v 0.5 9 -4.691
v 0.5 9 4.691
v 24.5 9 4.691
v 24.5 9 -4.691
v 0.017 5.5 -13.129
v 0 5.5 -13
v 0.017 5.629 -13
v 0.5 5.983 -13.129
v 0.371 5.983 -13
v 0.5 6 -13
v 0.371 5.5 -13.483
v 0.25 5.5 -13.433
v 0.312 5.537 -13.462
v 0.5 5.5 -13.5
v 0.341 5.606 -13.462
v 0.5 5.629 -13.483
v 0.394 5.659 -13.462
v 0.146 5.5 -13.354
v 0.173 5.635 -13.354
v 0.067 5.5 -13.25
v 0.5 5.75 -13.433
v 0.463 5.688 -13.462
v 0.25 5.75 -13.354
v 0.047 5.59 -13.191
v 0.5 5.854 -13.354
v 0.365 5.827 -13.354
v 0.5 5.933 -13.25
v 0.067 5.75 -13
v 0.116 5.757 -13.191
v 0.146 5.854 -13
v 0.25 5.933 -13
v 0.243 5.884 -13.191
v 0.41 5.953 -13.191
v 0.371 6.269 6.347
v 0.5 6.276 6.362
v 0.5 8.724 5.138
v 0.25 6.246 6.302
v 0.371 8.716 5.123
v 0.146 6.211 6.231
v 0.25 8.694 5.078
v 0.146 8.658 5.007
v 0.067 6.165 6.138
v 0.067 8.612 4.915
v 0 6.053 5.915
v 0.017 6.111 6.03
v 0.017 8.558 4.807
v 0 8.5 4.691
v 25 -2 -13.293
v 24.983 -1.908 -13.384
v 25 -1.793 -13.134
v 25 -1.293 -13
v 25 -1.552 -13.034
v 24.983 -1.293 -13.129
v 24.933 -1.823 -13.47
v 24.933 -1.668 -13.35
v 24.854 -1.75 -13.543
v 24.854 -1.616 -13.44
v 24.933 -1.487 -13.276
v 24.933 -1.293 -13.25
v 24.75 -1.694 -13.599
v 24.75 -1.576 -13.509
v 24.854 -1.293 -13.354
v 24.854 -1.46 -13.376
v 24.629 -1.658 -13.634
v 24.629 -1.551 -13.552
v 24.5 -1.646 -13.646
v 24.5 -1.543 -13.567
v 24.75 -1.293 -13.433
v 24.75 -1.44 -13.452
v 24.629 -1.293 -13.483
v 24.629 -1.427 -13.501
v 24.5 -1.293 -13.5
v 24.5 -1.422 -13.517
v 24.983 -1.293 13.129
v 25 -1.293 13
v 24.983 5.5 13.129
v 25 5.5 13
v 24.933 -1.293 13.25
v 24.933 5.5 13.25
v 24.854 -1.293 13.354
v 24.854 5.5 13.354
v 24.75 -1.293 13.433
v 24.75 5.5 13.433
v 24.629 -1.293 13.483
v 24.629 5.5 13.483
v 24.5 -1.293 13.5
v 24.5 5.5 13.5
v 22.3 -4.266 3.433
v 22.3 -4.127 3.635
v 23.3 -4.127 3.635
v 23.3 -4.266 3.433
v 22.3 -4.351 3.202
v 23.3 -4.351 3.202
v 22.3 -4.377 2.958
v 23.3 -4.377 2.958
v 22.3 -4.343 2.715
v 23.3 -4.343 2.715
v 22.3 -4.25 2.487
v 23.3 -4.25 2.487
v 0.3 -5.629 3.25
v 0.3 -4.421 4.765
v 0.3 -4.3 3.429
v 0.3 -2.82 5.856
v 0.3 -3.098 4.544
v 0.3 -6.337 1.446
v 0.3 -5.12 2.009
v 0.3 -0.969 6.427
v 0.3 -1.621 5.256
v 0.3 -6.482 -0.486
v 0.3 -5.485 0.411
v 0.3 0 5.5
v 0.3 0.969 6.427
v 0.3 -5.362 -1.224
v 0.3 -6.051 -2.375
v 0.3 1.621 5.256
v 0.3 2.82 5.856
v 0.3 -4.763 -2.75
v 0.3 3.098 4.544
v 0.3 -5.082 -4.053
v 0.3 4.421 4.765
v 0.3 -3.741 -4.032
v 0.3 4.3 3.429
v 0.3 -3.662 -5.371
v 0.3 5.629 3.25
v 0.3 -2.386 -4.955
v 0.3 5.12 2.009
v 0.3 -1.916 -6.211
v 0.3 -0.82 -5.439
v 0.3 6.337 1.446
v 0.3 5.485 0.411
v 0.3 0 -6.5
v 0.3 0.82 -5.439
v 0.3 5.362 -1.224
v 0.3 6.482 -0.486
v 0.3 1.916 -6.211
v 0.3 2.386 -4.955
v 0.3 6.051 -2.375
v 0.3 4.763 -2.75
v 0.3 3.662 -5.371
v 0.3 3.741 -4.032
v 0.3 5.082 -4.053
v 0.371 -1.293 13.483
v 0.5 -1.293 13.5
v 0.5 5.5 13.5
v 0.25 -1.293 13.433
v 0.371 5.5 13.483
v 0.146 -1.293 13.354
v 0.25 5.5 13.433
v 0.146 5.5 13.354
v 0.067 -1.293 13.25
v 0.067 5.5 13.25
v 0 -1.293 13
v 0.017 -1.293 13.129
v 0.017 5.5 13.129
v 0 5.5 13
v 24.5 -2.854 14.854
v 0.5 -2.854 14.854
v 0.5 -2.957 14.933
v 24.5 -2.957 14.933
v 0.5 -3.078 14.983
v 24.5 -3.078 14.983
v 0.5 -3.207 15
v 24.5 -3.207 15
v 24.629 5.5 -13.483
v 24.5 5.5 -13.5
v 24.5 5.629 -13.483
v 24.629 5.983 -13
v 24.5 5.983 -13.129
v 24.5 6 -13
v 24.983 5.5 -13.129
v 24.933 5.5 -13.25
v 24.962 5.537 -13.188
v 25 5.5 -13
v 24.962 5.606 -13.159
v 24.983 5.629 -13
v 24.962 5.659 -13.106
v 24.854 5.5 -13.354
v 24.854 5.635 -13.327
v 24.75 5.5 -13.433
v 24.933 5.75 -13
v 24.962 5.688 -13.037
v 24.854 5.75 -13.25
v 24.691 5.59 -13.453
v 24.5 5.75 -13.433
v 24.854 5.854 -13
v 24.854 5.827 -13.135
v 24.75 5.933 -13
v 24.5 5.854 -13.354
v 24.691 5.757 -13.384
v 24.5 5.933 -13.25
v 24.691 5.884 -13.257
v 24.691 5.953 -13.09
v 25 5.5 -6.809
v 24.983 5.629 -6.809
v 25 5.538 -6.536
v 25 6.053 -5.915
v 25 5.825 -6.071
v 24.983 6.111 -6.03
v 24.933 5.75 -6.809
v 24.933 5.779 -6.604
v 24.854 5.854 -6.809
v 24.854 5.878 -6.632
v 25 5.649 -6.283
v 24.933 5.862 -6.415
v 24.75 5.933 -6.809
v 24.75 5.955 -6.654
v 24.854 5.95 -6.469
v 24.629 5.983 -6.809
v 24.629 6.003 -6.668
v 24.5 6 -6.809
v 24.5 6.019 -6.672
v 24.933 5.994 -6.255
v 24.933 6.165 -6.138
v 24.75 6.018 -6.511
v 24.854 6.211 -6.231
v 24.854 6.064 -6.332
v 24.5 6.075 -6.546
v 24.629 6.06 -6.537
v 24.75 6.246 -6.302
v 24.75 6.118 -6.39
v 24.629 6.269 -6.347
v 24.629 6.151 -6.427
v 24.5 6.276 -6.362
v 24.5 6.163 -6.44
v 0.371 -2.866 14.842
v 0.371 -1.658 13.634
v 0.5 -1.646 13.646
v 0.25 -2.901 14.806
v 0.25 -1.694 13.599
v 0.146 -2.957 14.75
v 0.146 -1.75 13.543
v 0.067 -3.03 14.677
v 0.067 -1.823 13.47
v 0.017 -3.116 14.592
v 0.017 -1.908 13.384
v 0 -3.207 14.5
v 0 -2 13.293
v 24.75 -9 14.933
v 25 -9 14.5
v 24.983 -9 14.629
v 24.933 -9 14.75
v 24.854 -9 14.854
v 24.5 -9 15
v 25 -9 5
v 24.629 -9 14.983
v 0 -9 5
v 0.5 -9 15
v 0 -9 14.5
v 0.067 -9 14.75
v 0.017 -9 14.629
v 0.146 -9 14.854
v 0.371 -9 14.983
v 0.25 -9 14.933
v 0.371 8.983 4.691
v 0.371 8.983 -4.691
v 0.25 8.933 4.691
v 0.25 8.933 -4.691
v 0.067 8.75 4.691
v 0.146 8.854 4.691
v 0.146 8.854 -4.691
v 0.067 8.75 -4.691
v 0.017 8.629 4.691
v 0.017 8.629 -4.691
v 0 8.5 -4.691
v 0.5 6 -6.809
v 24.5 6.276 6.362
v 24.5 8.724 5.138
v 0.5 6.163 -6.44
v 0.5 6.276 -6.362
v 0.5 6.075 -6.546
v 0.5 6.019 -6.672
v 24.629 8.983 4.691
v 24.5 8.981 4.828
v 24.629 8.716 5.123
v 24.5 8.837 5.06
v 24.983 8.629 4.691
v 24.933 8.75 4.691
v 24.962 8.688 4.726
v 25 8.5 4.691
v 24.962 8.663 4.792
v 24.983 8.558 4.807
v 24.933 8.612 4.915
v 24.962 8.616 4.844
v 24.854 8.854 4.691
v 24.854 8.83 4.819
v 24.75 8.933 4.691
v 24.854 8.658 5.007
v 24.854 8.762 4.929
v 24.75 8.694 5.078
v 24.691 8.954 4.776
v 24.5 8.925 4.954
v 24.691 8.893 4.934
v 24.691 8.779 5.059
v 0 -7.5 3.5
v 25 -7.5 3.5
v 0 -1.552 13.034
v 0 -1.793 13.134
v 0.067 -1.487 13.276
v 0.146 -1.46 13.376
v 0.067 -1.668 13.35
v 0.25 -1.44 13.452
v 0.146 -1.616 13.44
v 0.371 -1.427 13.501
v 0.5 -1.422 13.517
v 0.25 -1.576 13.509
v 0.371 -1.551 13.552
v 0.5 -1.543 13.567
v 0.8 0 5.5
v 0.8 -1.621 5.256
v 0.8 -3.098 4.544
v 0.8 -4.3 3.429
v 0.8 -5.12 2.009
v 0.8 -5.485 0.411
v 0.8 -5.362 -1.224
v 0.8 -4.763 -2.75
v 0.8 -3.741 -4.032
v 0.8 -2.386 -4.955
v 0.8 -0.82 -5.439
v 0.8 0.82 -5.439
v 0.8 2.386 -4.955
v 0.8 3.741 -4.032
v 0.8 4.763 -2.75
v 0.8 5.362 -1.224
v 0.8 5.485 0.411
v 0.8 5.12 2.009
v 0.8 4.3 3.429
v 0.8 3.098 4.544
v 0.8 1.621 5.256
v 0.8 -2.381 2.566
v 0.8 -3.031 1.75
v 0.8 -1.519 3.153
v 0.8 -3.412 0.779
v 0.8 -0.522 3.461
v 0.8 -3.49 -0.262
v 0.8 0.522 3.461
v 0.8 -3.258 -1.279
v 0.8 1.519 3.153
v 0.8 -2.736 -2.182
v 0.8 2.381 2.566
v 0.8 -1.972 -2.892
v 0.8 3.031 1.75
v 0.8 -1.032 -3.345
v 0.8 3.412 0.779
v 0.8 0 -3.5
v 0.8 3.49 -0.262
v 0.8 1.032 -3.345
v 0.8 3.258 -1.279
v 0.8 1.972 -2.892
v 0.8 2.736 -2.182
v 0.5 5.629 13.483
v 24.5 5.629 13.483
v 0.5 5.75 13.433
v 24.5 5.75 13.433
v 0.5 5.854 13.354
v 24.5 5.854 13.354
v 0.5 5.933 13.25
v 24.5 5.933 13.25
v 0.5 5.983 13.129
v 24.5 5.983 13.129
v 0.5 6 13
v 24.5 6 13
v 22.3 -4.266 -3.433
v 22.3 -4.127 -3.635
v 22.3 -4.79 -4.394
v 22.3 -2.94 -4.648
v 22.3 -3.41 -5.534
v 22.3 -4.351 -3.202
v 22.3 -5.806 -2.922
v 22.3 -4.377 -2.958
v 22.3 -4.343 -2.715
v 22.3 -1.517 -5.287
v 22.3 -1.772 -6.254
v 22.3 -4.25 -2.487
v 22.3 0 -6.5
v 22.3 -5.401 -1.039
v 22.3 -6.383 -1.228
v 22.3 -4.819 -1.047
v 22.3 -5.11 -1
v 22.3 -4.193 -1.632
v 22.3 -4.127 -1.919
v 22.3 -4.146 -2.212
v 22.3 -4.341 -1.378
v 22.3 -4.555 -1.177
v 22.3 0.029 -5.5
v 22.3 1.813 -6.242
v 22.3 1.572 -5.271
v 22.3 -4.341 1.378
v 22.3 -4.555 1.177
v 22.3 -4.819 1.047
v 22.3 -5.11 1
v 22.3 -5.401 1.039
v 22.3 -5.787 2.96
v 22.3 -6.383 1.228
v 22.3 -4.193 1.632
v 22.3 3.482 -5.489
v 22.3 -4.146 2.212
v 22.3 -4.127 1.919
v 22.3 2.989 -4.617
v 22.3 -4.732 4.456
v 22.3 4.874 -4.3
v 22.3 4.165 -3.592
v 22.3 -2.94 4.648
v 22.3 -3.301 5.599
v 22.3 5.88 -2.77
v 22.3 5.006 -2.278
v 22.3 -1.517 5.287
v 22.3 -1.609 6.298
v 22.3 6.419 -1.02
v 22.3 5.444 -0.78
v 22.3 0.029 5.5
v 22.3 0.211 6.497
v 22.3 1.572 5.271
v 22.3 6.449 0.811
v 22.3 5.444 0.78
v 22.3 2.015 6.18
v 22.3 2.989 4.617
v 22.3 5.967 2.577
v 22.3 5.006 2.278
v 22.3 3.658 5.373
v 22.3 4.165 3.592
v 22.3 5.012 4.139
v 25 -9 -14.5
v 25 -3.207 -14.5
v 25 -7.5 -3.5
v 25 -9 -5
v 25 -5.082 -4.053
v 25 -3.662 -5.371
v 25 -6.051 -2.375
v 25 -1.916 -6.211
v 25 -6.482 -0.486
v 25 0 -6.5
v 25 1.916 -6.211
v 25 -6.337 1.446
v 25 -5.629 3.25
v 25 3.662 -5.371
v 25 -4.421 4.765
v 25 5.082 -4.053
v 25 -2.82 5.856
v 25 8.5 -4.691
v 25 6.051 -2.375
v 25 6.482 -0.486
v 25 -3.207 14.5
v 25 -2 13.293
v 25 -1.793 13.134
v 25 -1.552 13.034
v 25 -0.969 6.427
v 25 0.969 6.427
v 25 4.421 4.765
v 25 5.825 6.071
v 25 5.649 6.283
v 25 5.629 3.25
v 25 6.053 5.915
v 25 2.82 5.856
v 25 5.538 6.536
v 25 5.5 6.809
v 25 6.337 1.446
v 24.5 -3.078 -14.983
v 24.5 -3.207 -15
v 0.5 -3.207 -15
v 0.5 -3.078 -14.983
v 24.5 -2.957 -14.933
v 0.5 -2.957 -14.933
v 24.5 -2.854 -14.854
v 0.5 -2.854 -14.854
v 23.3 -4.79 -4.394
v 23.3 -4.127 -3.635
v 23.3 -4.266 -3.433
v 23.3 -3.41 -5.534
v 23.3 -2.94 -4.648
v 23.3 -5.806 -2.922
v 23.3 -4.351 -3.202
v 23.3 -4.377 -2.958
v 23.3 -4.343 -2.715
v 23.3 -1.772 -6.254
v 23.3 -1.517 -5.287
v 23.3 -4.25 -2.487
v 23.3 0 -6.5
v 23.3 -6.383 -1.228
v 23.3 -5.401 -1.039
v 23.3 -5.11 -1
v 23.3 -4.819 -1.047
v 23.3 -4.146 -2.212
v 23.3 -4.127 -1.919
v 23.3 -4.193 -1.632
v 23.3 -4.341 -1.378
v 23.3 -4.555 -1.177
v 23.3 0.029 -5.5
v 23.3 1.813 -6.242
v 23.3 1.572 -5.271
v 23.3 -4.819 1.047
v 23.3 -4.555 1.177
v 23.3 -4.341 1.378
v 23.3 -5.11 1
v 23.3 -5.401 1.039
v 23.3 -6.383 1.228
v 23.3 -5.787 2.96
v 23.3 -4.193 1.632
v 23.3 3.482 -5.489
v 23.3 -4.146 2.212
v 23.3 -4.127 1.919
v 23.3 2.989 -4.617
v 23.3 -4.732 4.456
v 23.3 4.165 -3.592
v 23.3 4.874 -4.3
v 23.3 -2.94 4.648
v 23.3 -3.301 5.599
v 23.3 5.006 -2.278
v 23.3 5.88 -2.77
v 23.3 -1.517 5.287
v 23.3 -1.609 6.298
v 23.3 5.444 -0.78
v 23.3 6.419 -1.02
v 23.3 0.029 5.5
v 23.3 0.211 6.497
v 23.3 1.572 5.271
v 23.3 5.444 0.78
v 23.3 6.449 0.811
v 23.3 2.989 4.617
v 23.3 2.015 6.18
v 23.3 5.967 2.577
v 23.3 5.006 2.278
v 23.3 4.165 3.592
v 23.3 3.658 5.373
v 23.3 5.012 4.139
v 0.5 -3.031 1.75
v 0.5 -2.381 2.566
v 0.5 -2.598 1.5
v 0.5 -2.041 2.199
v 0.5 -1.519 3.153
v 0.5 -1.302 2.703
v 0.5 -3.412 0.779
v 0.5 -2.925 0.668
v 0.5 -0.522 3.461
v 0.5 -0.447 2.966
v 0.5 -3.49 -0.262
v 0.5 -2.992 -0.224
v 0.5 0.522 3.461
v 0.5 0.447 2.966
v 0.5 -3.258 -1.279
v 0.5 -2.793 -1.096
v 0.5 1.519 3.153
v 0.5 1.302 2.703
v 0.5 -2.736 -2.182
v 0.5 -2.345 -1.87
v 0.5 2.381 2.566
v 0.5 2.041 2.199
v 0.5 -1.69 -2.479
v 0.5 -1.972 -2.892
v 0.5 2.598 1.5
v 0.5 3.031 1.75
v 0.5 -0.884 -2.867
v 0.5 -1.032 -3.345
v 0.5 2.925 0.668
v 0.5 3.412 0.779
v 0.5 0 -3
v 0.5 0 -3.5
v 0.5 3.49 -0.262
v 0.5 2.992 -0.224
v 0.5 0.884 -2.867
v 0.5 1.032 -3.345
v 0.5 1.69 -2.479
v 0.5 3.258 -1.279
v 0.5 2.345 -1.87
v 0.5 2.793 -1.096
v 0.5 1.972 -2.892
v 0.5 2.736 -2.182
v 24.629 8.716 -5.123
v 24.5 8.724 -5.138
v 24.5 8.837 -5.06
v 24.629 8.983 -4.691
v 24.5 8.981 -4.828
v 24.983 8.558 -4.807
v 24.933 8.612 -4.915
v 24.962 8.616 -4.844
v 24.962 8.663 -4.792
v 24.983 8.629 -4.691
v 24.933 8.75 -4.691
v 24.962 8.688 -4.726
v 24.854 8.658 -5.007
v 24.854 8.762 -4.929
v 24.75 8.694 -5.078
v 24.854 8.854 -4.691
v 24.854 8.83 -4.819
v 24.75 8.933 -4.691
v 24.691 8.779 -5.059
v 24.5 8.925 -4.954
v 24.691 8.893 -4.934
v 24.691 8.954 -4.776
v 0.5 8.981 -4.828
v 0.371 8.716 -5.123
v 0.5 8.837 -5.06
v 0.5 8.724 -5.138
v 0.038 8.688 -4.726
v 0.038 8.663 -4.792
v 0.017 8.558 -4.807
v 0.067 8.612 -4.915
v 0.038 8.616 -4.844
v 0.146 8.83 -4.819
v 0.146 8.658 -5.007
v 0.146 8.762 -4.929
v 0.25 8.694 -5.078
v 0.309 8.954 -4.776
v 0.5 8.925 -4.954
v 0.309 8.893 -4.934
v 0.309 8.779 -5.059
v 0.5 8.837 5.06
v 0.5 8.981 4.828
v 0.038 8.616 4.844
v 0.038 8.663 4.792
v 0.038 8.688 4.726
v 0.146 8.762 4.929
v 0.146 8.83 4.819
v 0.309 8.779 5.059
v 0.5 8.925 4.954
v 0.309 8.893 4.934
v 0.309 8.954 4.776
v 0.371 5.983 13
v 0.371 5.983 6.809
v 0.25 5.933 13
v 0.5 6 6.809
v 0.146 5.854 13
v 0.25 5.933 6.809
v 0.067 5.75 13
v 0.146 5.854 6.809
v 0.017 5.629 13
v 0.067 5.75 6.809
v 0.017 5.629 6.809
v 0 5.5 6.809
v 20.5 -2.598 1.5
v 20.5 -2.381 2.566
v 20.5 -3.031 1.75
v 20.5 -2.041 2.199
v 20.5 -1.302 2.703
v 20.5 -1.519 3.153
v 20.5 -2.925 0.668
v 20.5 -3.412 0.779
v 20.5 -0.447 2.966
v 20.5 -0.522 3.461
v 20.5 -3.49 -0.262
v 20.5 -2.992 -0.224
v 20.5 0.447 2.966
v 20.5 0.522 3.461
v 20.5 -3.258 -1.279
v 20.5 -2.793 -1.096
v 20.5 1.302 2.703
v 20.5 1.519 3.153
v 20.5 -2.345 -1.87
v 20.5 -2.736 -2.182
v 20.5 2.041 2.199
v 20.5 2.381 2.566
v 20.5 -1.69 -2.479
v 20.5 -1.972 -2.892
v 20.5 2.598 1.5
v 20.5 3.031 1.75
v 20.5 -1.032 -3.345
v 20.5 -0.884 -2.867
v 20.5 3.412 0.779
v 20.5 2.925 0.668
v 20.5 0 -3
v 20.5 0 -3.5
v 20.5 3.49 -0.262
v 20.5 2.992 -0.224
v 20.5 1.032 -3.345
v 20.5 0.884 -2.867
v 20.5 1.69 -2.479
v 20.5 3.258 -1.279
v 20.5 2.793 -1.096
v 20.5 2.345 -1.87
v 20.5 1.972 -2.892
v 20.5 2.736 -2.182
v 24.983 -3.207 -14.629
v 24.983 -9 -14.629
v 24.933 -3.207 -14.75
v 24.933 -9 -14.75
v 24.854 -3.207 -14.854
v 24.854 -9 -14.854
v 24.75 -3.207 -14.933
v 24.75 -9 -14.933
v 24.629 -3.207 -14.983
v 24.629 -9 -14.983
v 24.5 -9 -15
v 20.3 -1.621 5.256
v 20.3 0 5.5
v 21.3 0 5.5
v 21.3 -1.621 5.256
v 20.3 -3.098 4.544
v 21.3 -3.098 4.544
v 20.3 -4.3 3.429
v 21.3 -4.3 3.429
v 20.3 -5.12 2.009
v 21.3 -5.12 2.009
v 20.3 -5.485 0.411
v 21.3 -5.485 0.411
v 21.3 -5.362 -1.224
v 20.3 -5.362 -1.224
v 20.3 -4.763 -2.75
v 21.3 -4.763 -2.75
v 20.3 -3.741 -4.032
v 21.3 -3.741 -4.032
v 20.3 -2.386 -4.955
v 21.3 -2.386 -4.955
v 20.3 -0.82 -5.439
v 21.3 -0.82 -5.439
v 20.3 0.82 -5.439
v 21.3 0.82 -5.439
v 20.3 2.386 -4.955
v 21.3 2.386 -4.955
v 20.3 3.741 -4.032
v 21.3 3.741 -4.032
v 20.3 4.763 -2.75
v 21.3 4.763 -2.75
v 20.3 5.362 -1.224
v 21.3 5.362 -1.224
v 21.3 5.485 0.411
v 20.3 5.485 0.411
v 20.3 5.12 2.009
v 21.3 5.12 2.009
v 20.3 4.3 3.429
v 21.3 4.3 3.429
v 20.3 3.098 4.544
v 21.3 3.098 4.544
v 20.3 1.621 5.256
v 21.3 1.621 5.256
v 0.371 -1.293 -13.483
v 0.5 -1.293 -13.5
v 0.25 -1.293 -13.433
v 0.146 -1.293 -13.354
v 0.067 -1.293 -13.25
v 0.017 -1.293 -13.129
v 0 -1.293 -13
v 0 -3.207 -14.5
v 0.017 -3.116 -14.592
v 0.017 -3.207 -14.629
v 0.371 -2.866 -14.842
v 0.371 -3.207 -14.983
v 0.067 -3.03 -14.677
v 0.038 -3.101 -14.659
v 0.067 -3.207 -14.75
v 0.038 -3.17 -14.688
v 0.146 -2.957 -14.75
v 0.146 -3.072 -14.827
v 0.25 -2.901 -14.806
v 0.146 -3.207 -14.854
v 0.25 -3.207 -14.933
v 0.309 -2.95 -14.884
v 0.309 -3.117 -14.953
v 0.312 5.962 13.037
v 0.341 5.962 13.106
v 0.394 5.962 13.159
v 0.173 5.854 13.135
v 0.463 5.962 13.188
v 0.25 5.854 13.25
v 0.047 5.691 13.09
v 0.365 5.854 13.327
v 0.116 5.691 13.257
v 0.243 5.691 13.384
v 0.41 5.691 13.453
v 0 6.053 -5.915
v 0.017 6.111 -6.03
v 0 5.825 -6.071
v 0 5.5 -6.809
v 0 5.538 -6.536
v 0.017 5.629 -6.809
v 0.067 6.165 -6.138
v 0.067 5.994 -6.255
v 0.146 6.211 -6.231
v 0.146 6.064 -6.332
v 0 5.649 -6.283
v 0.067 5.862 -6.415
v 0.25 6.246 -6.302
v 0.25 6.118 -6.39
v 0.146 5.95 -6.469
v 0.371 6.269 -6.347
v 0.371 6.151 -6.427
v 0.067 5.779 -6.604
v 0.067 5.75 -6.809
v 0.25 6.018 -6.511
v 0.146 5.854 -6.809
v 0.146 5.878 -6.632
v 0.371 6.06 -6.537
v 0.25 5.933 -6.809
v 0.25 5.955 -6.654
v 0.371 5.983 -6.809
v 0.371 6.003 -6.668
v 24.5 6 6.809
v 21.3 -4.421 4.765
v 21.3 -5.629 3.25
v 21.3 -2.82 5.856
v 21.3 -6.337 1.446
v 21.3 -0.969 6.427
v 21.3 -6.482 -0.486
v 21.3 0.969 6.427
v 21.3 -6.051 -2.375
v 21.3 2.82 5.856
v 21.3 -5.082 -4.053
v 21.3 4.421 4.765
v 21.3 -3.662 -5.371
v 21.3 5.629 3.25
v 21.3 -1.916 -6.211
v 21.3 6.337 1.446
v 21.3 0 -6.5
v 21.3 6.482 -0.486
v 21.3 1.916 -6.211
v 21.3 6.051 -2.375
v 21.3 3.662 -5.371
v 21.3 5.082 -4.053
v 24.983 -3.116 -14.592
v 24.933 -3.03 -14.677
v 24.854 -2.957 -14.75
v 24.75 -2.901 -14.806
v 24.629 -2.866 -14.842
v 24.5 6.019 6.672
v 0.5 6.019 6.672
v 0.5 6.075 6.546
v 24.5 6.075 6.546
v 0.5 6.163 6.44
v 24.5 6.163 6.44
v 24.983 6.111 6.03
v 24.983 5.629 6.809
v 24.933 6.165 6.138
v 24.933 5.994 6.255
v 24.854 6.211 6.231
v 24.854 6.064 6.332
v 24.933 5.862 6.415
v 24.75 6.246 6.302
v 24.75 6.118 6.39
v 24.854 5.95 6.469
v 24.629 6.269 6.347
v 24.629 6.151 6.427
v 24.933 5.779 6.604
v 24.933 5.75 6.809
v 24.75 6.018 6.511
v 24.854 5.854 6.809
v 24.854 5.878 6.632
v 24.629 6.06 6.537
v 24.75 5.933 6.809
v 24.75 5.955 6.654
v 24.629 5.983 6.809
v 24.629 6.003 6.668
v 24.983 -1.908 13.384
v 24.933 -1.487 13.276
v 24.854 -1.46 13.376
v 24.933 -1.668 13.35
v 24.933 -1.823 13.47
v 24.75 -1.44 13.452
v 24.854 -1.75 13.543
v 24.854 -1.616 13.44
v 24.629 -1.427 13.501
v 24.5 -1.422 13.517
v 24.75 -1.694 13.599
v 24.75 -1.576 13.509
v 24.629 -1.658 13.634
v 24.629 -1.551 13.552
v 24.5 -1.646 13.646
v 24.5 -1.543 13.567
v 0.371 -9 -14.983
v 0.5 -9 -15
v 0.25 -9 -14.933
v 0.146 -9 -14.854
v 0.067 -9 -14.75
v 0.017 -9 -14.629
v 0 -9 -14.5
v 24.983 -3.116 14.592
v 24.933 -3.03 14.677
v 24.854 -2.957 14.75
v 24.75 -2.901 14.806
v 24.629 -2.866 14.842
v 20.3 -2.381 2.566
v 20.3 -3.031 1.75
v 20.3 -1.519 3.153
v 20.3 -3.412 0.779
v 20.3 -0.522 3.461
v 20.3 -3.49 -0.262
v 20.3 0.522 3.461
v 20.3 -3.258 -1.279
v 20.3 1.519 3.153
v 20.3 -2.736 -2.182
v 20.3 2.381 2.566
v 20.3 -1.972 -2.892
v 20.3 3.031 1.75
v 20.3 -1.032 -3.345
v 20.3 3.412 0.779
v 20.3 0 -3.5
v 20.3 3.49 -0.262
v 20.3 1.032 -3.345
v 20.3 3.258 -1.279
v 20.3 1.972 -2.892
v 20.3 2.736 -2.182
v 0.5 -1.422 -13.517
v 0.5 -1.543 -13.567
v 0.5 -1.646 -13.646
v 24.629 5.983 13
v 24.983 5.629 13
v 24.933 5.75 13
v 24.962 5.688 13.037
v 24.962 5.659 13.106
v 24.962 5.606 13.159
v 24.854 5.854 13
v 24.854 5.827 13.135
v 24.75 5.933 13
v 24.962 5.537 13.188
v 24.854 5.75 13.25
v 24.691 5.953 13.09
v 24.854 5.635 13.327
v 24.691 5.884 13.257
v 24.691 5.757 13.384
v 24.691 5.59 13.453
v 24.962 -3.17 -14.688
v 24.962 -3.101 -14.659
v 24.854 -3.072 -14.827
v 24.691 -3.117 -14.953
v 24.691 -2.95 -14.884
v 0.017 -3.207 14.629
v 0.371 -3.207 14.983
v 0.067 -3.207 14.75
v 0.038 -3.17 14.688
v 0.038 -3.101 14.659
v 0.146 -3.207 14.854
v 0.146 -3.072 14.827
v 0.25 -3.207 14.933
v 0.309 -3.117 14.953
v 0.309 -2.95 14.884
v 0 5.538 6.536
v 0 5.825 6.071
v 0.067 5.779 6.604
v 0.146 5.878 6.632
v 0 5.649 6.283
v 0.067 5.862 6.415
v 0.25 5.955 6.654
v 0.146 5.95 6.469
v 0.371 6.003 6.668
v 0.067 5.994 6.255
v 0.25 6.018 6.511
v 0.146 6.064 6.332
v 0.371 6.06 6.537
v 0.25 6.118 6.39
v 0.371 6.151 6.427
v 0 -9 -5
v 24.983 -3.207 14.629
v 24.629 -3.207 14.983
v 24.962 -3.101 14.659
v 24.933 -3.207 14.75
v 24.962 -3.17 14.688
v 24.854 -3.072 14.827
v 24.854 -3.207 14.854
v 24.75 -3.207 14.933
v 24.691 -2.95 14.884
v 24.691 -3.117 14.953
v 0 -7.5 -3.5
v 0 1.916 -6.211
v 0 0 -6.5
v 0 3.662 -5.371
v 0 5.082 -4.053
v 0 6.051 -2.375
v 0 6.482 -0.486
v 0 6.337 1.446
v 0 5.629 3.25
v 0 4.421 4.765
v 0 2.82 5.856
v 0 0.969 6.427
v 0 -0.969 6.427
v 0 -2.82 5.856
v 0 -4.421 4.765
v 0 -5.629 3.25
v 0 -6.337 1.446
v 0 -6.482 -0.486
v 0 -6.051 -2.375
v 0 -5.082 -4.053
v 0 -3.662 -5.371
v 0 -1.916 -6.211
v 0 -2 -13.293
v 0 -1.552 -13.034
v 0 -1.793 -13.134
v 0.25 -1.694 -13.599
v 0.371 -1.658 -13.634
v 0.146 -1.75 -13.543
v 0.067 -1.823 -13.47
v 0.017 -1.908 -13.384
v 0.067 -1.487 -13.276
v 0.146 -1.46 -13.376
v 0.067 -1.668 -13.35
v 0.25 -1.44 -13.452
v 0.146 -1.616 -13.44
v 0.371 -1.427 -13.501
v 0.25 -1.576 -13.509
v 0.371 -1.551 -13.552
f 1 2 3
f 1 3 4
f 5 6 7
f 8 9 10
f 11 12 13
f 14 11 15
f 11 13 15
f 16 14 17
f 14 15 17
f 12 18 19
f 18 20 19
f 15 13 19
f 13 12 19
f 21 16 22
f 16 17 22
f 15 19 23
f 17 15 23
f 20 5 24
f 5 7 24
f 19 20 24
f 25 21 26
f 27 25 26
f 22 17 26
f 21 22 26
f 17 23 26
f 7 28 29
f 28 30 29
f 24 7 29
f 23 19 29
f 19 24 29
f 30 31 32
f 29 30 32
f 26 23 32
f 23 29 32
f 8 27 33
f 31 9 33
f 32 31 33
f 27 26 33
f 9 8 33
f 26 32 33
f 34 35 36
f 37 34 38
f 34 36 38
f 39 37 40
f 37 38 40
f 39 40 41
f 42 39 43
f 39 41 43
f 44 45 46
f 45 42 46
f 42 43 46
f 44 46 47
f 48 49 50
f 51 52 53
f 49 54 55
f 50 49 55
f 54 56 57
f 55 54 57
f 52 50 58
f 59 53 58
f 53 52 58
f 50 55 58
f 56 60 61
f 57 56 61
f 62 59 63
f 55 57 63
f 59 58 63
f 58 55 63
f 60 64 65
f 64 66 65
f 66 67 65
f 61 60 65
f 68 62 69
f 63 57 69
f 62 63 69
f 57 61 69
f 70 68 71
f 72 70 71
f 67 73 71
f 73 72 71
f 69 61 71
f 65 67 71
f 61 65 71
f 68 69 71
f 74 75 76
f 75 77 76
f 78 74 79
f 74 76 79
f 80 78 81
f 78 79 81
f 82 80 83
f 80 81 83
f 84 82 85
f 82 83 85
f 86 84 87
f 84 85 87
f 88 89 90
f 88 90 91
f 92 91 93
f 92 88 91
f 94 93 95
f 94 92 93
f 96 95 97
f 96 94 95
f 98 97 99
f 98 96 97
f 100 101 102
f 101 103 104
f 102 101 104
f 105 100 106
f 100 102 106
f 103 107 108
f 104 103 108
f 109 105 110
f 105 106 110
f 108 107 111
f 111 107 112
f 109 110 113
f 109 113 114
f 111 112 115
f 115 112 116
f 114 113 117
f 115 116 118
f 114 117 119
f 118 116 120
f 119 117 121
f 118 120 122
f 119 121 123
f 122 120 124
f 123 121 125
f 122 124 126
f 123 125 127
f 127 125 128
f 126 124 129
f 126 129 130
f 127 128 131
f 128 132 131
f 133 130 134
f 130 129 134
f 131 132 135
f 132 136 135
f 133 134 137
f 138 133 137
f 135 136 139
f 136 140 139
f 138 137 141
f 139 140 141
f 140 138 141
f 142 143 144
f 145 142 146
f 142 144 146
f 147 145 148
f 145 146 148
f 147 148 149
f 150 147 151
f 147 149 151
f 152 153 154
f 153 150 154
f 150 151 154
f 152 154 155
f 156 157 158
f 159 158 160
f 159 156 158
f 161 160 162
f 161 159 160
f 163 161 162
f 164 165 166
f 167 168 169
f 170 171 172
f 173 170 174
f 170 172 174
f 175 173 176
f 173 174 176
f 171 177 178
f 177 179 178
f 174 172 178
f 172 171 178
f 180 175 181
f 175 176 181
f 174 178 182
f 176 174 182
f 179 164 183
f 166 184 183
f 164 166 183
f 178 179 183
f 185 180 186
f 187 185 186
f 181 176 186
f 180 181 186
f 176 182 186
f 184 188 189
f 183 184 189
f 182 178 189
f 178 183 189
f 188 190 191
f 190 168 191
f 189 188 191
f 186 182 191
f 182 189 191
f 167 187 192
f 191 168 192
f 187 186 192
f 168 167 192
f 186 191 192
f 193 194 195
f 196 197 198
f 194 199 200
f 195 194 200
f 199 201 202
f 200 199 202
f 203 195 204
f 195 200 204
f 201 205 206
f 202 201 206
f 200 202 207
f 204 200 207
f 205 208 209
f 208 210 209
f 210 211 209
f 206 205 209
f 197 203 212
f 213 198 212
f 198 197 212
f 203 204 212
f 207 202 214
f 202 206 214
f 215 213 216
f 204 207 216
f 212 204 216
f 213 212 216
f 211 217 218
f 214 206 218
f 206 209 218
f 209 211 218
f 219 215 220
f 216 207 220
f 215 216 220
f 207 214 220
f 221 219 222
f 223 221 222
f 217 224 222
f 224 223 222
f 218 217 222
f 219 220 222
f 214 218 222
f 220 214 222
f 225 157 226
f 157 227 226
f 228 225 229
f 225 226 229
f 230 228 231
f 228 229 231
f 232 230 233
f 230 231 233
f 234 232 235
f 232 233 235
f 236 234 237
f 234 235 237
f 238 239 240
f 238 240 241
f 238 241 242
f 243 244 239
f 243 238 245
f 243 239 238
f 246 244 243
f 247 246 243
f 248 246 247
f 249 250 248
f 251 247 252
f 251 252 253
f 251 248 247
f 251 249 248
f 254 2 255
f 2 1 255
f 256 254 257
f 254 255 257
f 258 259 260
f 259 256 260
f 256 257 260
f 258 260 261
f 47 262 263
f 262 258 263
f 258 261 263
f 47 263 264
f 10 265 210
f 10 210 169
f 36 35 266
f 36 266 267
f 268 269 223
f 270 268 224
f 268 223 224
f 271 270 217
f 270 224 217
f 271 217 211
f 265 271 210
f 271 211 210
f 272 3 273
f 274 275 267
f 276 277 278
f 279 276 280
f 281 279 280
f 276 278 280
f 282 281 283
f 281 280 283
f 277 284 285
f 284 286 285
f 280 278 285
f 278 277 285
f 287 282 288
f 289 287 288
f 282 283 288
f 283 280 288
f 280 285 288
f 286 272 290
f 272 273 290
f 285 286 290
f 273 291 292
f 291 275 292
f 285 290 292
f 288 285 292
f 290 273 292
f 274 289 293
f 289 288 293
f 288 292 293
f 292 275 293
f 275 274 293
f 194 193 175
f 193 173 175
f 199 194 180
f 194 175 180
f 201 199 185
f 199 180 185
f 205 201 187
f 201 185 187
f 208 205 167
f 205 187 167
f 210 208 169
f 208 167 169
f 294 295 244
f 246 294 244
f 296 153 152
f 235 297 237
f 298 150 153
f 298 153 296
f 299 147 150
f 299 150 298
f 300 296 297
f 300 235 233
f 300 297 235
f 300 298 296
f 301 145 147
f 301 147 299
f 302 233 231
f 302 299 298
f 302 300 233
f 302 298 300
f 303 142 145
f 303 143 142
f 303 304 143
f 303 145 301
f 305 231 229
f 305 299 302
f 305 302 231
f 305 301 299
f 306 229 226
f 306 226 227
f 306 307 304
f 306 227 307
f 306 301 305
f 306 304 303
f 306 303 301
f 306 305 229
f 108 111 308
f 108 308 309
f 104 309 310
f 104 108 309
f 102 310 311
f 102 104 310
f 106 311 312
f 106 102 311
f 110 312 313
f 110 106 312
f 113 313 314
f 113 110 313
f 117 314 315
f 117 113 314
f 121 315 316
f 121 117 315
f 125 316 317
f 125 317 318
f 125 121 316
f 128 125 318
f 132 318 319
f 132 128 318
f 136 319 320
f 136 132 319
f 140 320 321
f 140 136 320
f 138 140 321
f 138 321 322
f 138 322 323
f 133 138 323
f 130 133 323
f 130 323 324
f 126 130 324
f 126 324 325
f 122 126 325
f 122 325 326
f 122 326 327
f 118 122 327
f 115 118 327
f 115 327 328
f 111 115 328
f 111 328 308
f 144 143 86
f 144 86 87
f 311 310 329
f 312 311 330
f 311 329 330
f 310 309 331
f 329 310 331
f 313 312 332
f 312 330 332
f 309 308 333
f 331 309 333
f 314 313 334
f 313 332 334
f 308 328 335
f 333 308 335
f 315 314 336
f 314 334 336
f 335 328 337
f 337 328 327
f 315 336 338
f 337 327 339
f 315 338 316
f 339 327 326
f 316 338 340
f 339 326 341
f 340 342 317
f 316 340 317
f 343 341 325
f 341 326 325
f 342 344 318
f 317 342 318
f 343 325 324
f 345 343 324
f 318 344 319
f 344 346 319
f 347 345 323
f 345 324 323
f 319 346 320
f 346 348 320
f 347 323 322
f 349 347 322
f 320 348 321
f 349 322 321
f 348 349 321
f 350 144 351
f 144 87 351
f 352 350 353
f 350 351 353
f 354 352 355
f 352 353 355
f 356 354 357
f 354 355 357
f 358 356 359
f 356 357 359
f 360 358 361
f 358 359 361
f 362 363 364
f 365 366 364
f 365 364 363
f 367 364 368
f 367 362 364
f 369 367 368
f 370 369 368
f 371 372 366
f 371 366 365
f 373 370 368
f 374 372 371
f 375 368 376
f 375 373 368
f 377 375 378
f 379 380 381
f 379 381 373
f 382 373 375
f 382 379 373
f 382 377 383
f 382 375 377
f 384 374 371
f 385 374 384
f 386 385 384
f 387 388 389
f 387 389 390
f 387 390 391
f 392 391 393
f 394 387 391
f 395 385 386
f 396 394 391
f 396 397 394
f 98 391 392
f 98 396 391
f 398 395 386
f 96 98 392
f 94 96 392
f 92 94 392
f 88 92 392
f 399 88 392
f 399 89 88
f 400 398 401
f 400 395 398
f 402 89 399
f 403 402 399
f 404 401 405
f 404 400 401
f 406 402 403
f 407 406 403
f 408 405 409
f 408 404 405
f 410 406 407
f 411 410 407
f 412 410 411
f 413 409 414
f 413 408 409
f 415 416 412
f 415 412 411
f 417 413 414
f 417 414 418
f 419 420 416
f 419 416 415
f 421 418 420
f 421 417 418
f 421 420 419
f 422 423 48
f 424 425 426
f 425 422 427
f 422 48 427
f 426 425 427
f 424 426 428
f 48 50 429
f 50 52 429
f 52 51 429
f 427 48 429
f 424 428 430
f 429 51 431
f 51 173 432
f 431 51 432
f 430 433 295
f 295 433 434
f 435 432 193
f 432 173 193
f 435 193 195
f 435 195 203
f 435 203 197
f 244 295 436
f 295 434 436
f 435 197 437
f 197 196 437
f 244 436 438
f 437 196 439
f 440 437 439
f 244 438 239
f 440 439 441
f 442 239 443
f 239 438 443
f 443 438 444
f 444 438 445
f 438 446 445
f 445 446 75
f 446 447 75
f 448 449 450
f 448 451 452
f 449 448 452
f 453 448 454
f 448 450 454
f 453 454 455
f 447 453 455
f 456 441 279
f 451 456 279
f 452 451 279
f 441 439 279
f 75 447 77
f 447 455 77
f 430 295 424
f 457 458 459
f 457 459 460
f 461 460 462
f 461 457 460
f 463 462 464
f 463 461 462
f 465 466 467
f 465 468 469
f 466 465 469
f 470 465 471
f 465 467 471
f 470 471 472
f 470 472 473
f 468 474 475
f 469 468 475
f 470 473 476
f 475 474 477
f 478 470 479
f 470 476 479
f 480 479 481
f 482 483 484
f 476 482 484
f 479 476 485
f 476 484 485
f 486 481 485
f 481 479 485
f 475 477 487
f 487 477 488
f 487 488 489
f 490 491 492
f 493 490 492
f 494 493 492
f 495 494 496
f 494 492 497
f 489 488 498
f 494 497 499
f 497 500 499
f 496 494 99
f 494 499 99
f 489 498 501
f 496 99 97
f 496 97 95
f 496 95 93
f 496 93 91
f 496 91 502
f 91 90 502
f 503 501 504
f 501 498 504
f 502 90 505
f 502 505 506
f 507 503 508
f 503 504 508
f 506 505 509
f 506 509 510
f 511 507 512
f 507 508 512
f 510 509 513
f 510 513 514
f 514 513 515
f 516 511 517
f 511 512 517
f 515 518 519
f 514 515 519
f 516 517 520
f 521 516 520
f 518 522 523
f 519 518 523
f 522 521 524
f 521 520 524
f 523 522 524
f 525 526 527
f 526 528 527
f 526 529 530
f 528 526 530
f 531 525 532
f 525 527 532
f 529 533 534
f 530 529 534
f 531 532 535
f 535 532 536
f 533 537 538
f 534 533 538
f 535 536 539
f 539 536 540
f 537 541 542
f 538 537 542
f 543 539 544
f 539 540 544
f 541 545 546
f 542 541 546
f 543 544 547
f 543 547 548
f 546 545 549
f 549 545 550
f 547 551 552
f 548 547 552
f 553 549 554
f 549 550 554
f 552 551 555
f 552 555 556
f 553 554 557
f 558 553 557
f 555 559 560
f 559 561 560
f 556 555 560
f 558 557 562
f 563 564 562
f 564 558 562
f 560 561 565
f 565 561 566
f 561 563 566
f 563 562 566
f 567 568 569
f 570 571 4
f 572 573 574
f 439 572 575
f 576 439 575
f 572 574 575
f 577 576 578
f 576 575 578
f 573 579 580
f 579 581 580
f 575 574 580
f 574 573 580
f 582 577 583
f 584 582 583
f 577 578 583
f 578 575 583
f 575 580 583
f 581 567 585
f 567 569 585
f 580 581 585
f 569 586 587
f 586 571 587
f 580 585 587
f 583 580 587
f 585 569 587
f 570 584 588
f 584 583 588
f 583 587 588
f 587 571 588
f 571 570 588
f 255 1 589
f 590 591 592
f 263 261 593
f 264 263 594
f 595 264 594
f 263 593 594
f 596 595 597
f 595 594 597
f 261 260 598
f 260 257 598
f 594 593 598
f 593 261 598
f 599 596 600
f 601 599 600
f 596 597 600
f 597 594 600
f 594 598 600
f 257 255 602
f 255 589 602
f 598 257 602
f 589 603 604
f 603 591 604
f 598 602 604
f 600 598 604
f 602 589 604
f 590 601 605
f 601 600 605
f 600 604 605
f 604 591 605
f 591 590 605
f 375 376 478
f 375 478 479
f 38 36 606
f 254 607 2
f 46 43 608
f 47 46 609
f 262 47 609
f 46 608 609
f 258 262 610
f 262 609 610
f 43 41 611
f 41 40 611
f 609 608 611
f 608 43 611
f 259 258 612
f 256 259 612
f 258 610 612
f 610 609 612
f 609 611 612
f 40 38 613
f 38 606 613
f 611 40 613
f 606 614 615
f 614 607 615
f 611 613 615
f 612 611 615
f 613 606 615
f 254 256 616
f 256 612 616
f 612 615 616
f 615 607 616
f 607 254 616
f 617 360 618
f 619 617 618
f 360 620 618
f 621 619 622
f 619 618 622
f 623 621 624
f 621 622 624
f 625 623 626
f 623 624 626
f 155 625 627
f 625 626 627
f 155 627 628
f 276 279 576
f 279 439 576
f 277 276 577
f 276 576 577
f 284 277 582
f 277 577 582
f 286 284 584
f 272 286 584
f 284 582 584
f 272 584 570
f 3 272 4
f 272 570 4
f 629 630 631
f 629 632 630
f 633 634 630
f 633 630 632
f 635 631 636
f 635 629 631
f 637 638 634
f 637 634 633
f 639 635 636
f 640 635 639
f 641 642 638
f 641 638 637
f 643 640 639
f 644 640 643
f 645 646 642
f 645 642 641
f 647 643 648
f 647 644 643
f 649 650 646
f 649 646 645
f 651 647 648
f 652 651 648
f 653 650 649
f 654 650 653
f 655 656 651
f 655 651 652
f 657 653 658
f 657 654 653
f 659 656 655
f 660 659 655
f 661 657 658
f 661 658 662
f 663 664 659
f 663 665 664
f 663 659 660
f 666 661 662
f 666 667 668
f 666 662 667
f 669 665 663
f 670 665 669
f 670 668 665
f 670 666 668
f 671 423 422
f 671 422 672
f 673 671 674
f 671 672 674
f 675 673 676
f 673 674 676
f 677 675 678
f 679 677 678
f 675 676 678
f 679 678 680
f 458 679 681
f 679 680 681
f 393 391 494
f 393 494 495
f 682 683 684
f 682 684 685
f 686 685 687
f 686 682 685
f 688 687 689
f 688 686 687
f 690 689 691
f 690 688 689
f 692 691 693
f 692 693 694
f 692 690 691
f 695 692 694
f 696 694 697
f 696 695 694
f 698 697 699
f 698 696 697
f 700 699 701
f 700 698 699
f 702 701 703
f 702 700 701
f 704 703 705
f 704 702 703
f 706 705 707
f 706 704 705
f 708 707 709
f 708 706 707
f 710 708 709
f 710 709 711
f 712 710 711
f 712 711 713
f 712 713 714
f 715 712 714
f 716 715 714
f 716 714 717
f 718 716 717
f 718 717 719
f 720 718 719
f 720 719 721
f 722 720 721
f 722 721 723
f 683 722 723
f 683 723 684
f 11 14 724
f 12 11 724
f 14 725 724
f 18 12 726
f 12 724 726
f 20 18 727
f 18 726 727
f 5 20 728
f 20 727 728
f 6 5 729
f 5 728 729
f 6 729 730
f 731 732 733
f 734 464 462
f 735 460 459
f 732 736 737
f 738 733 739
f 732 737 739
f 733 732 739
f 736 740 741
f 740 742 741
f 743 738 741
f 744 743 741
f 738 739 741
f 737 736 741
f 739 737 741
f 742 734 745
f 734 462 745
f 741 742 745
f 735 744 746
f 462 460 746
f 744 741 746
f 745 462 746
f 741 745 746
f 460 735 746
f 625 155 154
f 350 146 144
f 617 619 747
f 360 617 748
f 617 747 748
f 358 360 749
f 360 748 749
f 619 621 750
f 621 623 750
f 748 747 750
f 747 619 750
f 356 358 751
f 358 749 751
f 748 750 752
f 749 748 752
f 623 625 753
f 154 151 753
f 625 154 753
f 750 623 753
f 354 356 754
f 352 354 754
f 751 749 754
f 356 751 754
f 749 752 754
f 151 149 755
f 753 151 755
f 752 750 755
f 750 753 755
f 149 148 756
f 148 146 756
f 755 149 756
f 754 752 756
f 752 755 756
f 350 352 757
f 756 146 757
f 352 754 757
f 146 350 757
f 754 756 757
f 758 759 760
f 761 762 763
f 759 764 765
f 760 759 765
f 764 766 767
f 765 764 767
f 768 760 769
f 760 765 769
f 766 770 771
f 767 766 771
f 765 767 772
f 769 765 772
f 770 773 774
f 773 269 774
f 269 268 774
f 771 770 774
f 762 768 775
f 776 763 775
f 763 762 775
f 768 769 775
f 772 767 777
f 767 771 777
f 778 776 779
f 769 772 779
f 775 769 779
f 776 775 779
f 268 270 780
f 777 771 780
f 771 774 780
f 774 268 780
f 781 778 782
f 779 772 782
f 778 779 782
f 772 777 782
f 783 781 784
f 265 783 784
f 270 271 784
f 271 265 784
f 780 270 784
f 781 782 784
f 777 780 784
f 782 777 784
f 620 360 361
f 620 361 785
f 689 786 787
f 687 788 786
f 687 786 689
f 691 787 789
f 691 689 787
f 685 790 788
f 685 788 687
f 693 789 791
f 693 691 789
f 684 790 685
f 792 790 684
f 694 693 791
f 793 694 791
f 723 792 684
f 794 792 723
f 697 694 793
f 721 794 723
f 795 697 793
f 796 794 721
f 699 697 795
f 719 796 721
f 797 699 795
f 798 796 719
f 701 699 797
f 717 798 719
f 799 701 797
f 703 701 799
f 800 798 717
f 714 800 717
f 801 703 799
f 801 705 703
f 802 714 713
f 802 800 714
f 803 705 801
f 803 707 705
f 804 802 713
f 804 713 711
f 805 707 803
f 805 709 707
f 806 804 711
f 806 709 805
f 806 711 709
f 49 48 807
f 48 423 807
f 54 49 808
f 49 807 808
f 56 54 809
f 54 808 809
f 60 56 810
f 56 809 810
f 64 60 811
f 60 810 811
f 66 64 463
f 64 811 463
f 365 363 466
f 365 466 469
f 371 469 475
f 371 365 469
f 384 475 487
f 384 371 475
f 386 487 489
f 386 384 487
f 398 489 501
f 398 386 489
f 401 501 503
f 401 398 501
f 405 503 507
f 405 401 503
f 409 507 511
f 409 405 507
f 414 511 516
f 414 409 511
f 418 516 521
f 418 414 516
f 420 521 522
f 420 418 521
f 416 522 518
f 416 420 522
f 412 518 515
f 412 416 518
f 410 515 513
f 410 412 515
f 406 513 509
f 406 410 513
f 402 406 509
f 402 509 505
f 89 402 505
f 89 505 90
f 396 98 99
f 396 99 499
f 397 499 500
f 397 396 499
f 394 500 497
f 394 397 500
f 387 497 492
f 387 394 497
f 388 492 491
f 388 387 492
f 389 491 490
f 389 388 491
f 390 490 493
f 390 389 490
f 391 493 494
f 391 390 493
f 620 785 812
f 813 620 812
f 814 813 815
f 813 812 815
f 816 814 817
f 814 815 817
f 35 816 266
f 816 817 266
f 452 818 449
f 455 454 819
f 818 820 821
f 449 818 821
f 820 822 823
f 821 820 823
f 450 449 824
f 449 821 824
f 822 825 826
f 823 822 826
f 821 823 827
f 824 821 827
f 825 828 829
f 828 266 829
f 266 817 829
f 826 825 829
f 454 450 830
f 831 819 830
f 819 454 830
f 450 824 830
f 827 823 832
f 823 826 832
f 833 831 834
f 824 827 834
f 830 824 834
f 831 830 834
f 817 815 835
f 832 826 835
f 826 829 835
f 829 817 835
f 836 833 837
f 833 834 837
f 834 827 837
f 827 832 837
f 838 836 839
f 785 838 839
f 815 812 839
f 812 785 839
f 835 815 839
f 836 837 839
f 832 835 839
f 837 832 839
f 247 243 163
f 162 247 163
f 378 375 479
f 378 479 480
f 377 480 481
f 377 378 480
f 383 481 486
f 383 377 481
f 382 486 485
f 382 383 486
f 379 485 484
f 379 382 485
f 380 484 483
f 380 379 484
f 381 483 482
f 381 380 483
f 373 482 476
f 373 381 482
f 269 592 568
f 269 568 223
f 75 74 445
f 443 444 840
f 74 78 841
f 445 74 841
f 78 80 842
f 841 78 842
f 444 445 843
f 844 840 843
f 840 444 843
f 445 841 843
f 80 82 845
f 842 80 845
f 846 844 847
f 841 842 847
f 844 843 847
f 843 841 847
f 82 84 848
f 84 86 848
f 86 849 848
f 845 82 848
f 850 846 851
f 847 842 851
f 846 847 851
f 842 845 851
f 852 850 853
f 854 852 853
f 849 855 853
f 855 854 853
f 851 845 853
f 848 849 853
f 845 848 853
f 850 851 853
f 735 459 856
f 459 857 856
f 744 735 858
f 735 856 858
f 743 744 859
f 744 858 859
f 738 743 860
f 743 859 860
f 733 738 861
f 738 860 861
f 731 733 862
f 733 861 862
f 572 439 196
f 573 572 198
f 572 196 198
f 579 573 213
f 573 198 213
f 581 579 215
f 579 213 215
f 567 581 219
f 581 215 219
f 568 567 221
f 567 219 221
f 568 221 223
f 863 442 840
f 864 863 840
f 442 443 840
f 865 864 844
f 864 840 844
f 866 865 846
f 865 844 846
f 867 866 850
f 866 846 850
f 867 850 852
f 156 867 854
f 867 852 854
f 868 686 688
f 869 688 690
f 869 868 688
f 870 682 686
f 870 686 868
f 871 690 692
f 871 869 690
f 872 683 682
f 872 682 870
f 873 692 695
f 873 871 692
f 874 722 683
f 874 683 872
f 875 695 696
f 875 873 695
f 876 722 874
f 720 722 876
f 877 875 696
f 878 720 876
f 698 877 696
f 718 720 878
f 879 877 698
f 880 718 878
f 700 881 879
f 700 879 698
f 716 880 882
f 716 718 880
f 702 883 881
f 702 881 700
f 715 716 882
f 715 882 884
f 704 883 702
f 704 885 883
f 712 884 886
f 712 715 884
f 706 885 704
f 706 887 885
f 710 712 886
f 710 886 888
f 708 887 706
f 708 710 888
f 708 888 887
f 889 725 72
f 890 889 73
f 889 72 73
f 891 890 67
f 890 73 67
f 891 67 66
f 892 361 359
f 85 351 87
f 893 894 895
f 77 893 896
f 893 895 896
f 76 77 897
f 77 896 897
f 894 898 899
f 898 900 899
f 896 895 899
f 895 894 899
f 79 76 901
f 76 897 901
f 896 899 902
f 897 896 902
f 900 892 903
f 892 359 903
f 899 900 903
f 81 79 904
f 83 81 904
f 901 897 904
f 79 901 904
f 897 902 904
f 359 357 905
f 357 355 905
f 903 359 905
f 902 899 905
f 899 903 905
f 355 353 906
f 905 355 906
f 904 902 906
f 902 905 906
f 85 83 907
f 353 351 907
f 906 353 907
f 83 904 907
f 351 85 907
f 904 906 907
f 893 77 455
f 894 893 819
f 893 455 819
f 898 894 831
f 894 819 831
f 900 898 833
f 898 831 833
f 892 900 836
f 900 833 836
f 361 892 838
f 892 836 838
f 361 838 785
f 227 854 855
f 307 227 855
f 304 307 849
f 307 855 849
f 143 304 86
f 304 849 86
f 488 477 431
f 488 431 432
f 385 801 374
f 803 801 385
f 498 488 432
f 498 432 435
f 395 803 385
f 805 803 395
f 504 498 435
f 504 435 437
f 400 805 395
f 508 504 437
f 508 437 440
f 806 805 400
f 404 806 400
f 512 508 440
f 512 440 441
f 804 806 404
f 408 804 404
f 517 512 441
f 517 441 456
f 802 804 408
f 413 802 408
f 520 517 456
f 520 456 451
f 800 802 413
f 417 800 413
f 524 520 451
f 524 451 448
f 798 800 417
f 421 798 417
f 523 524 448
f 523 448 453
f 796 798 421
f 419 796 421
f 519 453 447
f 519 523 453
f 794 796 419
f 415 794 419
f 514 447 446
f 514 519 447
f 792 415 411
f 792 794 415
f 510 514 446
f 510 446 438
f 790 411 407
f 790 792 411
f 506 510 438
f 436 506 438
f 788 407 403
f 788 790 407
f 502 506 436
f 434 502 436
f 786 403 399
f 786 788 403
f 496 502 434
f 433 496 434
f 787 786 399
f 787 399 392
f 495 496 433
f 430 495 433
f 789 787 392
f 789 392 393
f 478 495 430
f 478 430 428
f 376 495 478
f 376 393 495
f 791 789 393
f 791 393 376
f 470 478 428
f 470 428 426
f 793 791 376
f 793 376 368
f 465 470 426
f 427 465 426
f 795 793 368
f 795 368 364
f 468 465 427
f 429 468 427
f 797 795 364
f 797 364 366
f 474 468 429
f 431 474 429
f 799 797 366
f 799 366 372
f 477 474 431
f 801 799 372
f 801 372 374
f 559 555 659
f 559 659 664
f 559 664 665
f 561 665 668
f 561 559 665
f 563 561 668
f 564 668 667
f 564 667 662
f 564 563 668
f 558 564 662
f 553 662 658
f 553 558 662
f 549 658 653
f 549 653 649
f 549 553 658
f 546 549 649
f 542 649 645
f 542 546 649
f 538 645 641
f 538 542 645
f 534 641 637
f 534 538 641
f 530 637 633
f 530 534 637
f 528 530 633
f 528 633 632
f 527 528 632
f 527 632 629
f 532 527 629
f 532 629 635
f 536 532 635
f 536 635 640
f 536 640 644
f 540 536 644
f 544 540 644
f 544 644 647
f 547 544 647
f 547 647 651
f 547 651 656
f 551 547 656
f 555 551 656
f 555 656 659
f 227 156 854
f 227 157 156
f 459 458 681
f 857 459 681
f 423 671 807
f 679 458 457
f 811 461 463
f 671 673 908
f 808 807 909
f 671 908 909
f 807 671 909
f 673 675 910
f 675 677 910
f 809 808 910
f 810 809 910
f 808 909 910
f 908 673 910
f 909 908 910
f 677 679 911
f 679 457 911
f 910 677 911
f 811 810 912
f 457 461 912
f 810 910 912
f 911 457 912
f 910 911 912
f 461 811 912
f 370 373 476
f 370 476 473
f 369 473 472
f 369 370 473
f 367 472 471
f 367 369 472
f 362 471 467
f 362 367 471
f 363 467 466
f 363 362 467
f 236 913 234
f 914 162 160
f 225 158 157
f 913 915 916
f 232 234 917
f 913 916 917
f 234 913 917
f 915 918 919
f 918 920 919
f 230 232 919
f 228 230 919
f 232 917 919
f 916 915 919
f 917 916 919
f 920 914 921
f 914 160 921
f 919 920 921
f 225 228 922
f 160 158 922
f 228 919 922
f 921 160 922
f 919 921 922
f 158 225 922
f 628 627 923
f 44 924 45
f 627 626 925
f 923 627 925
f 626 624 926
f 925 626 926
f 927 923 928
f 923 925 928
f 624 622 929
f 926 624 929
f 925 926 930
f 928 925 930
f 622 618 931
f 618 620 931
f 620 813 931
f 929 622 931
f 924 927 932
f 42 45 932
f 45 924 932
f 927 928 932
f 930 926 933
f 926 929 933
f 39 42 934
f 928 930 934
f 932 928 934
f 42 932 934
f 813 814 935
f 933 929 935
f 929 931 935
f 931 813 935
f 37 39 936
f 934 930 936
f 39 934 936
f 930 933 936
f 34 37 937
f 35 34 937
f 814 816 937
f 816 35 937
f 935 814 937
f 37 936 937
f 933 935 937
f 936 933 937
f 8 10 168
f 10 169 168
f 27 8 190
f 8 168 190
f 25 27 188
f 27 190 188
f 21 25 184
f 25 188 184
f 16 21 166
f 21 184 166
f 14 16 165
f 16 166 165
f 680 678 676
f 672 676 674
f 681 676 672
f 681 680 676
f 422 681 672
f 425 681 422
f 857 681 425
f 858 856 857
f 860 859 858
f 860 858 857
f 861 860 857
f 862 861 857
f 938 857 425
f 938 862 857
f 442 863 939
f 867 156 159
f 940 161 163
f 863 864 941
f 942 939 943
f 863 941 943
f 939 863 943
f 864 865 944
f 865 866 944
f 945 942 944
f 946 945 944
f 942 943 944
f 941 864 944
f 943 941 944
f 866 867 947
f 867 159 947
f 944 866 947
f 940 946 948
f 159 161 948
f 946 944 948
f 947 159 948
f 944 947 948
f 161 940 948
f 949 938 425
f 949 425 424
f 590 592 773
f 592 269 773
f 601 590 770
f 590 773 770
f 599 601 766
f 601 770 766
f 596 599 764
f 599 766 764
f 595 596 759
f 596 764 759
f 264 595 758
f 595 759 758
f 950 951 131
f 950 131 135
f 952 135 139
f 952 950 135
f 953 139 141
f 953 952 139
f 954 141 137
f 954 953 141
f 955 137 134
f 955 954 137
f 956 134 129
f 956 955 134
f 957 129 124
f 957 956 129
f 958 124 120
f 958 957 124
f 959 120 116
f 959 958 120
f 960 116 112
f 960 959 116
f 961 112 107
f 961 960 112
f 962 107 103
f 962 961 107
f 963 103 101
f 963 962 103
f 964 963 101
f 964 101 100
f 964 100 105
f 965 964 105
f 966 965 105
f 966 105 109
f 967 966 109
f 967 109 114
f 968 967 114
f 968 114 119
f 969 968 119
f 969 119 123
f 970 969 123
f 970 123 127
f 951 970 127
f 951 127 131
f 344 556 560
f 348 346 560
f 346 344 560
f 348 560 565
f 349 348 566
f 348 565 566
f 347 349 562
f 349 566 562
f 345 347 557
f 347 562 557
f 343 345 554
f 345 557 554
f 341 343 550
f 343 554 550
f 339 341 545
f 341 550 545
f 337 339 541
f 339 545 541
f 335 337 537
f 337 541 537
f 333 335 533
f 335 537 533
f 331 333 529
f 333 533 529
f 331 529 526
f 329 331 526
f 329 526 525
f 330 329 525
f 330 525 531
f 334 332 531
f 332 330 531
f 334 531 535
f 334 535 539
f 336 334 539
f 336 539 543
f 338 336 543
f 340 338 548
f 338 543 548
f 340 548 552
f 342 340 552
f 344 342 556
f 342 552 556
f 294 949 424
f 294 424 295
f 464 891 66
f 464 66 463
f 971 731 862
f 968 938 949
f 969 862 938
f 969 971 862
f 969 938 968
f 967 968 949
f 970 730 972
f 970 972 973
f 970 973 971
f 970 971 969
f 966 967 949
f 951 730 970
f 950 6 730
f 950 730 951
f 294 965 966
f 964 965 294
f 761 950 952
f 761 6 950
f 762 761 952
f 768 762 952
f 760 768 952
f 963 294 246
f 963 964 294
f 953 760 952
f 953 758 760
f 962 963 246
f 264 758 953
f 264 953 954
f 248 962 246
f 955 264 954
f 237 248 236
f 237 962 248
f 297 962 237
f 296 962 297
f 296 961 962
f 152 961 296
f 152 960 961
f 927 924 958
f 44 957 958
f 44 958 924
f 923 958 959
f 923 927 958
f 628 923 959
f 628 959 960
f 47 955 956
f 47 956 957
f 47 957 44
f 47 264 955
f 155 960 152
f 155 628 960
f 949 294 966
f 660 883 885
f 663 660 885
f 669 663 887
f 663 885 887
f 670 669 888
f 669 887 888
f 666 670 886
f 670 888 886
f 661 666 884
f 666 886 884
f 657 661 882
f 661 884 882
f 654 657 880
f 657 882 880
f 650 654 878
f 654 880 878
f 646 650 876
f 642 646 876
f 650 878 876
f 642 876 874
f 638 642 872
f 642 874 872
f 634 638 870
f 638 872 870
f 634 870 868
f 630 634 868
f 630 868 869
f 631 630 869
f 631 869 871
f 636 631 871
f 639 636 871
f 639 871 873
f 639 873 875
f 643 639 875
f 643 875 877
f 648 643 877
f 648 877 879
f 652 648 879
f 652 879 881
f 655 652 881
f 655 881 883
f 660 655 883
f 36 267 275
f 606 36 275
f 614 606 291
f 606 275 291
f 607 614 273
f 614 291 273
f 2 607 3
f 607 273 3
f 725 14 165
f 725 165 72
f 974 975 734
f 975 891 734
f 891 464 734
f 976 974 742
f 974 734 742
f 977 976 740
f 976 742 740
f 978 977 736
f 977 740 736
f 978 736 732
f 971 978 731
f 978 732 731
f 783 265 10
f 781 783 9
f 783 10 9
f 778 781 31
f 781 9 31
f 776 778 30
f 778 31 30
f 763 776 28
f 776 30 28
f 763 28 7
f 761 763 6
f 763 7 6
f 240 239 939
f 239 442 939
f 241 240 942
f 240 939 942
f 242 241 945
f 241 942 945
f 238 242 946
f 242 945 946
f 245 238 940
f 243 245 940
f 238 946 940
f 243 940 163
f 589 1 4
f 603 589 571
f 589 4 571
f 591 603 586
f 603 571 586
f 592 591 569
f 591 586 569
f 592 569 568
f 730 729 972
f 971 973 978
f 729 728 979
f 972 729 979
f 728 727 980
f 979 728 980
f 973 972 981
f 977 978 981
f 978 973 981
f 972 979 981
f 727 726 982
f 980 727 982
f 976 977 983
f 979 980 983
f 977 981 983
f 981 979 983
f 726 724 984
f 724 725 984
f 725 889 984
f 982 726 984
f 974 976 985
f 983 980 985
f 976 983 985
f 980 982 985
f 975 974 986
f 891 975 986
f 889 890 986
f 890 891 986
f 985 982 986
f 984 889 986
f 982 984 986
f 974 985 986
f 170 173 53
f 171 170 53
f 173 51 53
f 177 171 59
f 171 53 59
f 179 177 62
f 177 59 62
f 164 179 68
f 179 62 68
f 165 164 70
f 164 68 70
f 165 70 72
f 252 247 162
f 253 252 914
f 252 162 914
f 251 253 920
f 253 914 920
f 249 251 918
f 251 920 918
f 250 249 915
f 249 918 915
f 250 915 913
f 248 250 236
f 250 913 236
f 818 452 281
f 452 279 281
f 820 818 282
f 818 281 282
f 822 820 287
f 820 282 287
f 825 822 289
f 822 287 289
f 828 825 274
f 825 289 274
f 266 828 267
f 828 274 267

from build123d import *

# Parameters (mm, degrees)
SKETCH1_R           = 6.5
BOSS_EXTRUDE1_DEPTH = 25
EXTRUDE_THIN1_START = 0.5
SKETCH1_4_R         = 3.5
SKETCH1_4_R_2       = 3
EXTRUDE_THIN1_DEPTH = 20
BOSS_EXTRUDE2_START = 0.8
SKETCH1_5_R         = 5.5
SKETCH1_5_R_2       = 3
BOSS_EXTRUDE2_DEPTH = 19.5
BOSS_EXTRUDE3_START = 0.3
SKETCH1_6_R         = 6.5
SKETCH1_6_R_2       = 5.5
BOSS_EXTRUDE3_DEPTH = 21
BOSS_EXTRUDE4_START = 1
BOSS_EXTRUDE4_DEPTH = 1
FILLET1_R           = 0.5


with BuildPart() as part:
    # Sketch1 → Boss-Extrude1 (new body)
    with BuildSketch(Plane(origin=(0, 0, 0), x_dir=(0, 0, -1), z_dir=(1, 0, 0))):
        Polygon((-15, -9), (-5, -9), (-3.5, -7.5), (3.5, -7.5), (5, -9), (15, -9), (15, -3), (13.5, -1.5), (13.5, 6), (6.5, 6), (5, 9), (-5, 9), (-6.5, 6), (-13.5, 6), (-13.5, -1.5), (-15, -3), align=None)
        Circle(SKETCH1_R, mode=Mode.SUBTRACT)
    extrude(amount=BOSS_EXTRUDE1_DEPTH)



with BuildPart() as body_2:
    # Sketch1<4> → Extrude-Thin1 (new body)
    with BuildSketch(Plane(origin=(0, 0, 0), x_dir=(0, 0, -1), z_dir=(1, 0, 0)).offset(EXTRUDE_THIN1_START)):
        Circle(SKETCH1_4_R)
        Circle(SKETCH1_4_R_2, mode=Mode.SUBTRACT)
    extrude(amount=EXTRUDE_THIN1_DEPTH)

    # Sketch1<5> → Boss-Extrude2 (add)
    with BuildSketch(Plane(origin=(0, 0, 0), x_dir=(0, 0, -1), z_dir=(1, 0, 0)).offset(BOSS_EXTRUDE2_START)):
        Circle(SKETCH1_5_R)
        Circle(SKETCH1_5_R_2, mode=Mode.SUBTRACT)
    extrude(amount=BOSS_EXTRUDE2_DEPTH)


with BuildPart() as part_1:
    add(part.part)

    add(body_2.part)  # Boss-Extrude3 merges body 2
    # Sketch1<6> → Boss-Extrude3 (add)
    with BuildSketch(Plane(origin=(0, 0, 0), x_dir=(0, 0, -1), z_dir=(1, 0, 0)).offset(BOSS_EXTRUDE3_START)):
        Circle(SKETCH1_6_R)
        Circle(SKETCH1_6_R_2, mode=Mode.SUBTRACT)
    extrude(amount=BOSS_EXTRUDE3_DEPTH)

    # Sketch3 → Boss-Extrude4 (add)
    with BuildSketch(Plane(origin=(21.3, 0, 0), x_dir=(0, 0, -1), z_dir=(1, 0, 0)).offset(BOSS_EXTRUDE4_START)):
        with BuildLine():
            Line((-1.039258499, -5.400920456), (-1.22821459, -6.382905993))
            ThreePointArc((-1.22821459, -6.382905993), (0, 6.5), (1.22821459, -6.382905993))
            Line((1.22821459, -6.382905993), (1.039258499, -5.400920456))
            ThreePointArc((1.039258499, -5.400920456), (1.377808725, -4.340610122), (2.487175706, -4.250171409))
            ThreePointArc((2.487175706, -4.250171409), (3.080776399, -4.371188169), (3.635318393, -4.12728242))
            ThreePointArc((3.635318393, -4.12728242), (0, 5.5), (-3.635318393, -4.12728242))
            ThreePointArc((-3.635318393, -4.12728242), (-3.080776399, -4.371188169), (-2.487175706, -4.250171409))
            ThreePointArc((-2.487175706, -4.250171409), (-1.377808725, -4.340610122), (-1.039258499, -5.400920456))
        make_face()
    extrude(amount=BOSS_EXTRUDE4_DEPTH)

    # Fillet1
    fillet1_edges = [part_1.edges().sort_by_distance(p)[0] for p in [
        (12.5, -1.5, -13.5),
        (12.5, -1.5, 13.5),
        (12.5, -3, 15),
        (12.5, -3, -15),
        (12.5, 6, -6.5),
        (12.5, 6, 6.5),
        (12.5, 9, 5),
        (12.5, 9, -5),
        (12.5, 6, -13.5),
        (12.5, 6, 13.5),
        (25, 7.5, -5.75),
        (25, 7.5, 5.75),
        (25, 2.25, 13.5),
        (0, -2.25, 14.25),
        (0, 7.5, 5.75),
        (25, -2.25, -14.25),
        (25, -6, -15),
        (25, 2.25, -13.5),
        (25, 9, 0),
        (25, 6, -10),
        (25, 6, 10),
        (25, -2.25, 14.25),
        (25, -6, 15),
        (0, -6, -15),
        (0, -2.25, -14.25),
        (0, 2.25, -13.5),
        (0, 7.5, -5.75),
        (0, 6, -10),
        (0, 9, 0),
        (0, -6, 15),
        (0, 2.25, 13.5),
        (0, 6, 10),
    ]]
    fillet(fillet1_edges, radius=FILLET1_R)


solid = part_1.part
